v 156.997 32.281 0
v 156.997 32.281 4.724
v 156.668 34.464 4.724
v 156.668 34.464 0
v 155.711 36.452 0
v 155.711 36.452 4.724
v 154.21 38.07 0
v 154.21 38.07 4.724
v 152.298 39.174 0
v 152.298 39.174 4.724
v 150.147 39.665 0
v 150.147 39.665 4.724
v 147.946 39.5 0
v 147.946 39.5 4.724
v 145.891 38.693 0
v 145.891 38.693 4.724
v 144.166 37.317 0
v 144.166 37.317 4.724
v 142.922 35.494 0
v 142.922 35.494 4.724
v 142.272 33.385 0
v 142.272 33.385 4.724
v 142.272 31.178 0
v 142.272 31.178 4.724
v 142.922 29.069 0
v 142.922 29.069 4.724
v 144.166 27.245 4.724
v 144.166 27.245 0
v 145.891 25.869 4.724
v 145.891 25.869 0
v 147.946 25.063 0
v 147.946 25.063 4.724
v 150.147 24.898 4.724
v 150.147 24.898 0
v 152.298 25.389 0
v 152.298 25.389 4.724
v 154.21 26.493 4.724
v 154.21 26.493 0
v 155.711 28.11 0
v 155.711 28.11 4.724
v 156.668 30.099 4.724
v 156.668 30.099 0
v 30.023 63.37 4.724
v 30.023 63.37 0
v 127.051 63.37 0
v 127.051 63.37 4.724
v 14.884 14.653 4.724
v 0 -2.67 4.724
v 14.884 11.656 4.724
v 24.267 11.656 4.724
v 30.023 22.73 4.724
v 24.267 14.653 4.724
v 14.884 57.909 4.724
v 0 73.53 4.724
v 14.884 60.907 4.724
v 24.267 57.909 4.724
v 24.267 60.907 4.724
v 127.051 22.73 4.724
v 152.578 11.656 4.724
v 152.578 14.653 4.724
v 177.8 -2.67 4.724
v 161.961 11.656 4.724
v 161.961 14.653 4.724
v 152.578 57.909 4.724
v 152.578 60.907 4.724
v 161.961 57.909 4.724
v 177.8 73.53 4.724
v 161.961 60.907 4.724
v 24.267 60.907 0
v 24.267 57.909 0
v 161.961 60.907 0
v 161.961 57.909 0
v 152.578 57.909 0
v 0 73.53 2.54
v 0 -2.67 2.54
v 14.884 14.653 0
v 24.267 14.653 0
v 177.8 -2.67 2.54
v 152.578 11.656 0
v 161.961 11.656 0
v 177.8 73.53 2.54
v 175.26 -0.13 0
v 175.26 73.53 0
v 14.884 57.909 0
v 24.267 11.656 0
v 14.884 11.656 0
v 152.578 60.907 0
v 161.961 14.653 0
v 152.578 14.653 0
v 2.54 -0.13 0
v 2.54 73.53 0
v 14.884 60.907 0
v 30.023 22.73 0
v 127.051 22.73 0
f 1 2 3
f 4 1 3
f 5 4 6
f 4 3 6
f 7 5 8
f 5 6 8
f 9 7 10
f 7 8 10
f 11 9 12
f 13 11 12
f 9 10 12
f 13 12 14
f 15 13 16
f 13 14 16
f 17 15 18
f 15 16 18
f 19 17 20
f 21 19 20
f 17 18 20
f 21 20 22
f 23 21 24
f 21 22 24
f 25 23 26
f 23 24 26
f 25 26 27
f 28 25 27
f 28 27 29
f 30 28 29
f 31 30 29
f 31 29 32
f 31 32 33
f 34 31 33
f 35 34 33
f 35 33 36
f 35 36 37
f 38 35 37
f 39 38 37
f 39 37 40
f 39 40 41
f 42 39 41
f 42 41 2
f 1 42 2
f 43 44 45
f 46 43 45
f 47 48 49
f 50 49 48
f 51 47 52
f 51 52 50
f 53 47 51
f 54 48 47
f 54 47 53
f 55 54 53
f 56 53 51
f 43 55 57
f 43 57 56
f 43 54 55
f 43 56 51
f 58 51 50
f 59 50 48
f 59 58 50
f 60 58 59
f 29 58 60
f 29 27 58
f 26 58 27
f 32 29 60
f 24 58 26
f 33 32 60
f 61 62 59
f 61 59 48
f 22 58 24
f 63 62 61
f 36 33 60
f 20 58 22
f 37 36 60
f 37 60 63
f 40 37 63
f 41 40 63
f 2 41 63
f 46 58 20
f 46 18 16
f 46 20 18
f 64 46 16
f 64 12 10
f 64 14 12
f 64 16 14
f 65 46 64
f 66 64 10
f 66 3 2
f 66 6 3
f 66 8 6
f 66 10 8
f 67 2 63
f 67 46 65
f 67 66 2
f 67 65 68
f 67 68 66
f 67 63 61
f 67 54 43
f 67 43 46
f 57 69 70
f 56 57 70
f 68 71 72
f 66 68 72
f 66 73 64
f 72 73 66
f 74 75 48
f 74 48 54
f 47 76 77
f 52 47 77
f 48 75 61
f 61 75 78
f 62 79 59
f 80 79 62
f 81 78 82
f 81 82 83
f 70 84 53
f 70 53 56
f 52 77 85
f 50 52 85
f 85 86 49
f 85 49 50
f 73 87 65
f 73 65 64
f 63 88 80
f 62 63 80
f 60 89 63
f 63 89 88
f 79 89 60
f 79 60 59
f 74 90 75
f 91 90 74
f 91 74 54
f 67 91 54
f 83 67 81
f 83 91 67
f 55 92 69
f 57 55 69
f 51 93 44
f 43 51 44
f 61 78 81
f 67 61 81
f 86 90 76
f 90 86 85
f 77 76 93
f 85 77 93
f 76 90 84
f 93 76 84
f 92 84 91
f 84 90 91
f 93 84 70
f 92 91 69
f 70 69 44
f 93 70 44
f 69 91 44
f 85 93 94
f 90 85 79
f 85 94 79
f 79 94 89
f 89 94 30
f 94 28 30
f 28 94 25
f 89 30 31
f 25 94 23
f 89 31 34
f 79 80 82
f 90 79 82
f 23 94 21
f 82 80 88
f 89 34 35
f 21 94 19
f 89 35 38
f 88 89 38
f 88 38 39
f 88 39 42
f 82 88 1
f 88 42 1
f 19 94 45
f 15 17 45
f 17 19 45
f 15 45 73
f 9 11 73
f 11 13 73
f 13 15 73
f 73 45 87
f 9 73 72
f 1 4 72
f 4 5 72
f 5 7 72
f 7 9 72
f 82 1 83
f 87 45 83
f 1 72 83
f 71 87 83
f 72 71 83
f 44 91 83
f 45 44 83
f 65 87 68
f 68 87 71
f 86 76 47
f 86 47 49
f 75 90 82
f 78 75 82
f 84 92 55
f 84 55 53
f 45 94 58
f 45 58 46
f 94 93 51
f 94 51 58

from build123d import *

# Parameters (mm, degrees)
F0_W     = 177.8
F0_H     = 76.2
F0_W_2   = 97.028
F0_H_2   = 40.64
F1_DEPTH = 4.7244
F2_R     = 7.4041
F3_DEPTH = 25.4
F4_SIZE  = 2.54
F5_W     = 9.382727
F5_H     = 2.9972
F6_DEPTH = 25.4


with BuildPart() as f1:
    # F0 (on Top) → F1 (new body)
    with BuildSketch(Plane.XY):
        with Locations((88.9, 35.43033)):
            Rectangle(F0_W, F0_H)
        with Locations((78.5368, 43.05033)):
            Rectangle(F0_W_2, F0_H_2, mode=Mode.SUBTRACT)
    extrude(amount=F1_DEPTH)

    # F2 (on face) → F3 (cut)
    with BuildSketch(Plane.XY.offset(4.7244)):
        with Locations((149.5933, 32.281343)):
            Circle(F2_R)
    extrude(amount=-F3_DEPTH, mode=Mode.SUBTRACT)

    # F4
    f4_edges = [f1.edges().sort_by_distance(p)[0] for p in [
        (0, 35.43033, 0),
        (88.9, -2.66967, 0),
        (177.8, 35.43033, 0),
    ]]
    chamfer(f4_edges, length=F4_SIZE)

    # F5 (on face) → F6 (cut)
    with BuildSketch(Plane(origin=(0, 0, 0), x_dir=(1, 0, 0), z_dir=(0, 0, -1))):
        with Locations((19.575764, -13.15453)):
            Rectangle(F5_W, F5_H)
        with Locations((19.575764, -59.40793)):
            Rectangle(F5_W, F5_H)
        with Locations((157.269163, -13.15453)):
            Rectangle(F5_W, F5_H)
        with Locations((157.269163, -59.40793)):
            Rectangle(F5_W, F5_H)
    extrude(amount=-F6_DEPTH, mode=Mode.SUBTRACT)


solid = f1.part
